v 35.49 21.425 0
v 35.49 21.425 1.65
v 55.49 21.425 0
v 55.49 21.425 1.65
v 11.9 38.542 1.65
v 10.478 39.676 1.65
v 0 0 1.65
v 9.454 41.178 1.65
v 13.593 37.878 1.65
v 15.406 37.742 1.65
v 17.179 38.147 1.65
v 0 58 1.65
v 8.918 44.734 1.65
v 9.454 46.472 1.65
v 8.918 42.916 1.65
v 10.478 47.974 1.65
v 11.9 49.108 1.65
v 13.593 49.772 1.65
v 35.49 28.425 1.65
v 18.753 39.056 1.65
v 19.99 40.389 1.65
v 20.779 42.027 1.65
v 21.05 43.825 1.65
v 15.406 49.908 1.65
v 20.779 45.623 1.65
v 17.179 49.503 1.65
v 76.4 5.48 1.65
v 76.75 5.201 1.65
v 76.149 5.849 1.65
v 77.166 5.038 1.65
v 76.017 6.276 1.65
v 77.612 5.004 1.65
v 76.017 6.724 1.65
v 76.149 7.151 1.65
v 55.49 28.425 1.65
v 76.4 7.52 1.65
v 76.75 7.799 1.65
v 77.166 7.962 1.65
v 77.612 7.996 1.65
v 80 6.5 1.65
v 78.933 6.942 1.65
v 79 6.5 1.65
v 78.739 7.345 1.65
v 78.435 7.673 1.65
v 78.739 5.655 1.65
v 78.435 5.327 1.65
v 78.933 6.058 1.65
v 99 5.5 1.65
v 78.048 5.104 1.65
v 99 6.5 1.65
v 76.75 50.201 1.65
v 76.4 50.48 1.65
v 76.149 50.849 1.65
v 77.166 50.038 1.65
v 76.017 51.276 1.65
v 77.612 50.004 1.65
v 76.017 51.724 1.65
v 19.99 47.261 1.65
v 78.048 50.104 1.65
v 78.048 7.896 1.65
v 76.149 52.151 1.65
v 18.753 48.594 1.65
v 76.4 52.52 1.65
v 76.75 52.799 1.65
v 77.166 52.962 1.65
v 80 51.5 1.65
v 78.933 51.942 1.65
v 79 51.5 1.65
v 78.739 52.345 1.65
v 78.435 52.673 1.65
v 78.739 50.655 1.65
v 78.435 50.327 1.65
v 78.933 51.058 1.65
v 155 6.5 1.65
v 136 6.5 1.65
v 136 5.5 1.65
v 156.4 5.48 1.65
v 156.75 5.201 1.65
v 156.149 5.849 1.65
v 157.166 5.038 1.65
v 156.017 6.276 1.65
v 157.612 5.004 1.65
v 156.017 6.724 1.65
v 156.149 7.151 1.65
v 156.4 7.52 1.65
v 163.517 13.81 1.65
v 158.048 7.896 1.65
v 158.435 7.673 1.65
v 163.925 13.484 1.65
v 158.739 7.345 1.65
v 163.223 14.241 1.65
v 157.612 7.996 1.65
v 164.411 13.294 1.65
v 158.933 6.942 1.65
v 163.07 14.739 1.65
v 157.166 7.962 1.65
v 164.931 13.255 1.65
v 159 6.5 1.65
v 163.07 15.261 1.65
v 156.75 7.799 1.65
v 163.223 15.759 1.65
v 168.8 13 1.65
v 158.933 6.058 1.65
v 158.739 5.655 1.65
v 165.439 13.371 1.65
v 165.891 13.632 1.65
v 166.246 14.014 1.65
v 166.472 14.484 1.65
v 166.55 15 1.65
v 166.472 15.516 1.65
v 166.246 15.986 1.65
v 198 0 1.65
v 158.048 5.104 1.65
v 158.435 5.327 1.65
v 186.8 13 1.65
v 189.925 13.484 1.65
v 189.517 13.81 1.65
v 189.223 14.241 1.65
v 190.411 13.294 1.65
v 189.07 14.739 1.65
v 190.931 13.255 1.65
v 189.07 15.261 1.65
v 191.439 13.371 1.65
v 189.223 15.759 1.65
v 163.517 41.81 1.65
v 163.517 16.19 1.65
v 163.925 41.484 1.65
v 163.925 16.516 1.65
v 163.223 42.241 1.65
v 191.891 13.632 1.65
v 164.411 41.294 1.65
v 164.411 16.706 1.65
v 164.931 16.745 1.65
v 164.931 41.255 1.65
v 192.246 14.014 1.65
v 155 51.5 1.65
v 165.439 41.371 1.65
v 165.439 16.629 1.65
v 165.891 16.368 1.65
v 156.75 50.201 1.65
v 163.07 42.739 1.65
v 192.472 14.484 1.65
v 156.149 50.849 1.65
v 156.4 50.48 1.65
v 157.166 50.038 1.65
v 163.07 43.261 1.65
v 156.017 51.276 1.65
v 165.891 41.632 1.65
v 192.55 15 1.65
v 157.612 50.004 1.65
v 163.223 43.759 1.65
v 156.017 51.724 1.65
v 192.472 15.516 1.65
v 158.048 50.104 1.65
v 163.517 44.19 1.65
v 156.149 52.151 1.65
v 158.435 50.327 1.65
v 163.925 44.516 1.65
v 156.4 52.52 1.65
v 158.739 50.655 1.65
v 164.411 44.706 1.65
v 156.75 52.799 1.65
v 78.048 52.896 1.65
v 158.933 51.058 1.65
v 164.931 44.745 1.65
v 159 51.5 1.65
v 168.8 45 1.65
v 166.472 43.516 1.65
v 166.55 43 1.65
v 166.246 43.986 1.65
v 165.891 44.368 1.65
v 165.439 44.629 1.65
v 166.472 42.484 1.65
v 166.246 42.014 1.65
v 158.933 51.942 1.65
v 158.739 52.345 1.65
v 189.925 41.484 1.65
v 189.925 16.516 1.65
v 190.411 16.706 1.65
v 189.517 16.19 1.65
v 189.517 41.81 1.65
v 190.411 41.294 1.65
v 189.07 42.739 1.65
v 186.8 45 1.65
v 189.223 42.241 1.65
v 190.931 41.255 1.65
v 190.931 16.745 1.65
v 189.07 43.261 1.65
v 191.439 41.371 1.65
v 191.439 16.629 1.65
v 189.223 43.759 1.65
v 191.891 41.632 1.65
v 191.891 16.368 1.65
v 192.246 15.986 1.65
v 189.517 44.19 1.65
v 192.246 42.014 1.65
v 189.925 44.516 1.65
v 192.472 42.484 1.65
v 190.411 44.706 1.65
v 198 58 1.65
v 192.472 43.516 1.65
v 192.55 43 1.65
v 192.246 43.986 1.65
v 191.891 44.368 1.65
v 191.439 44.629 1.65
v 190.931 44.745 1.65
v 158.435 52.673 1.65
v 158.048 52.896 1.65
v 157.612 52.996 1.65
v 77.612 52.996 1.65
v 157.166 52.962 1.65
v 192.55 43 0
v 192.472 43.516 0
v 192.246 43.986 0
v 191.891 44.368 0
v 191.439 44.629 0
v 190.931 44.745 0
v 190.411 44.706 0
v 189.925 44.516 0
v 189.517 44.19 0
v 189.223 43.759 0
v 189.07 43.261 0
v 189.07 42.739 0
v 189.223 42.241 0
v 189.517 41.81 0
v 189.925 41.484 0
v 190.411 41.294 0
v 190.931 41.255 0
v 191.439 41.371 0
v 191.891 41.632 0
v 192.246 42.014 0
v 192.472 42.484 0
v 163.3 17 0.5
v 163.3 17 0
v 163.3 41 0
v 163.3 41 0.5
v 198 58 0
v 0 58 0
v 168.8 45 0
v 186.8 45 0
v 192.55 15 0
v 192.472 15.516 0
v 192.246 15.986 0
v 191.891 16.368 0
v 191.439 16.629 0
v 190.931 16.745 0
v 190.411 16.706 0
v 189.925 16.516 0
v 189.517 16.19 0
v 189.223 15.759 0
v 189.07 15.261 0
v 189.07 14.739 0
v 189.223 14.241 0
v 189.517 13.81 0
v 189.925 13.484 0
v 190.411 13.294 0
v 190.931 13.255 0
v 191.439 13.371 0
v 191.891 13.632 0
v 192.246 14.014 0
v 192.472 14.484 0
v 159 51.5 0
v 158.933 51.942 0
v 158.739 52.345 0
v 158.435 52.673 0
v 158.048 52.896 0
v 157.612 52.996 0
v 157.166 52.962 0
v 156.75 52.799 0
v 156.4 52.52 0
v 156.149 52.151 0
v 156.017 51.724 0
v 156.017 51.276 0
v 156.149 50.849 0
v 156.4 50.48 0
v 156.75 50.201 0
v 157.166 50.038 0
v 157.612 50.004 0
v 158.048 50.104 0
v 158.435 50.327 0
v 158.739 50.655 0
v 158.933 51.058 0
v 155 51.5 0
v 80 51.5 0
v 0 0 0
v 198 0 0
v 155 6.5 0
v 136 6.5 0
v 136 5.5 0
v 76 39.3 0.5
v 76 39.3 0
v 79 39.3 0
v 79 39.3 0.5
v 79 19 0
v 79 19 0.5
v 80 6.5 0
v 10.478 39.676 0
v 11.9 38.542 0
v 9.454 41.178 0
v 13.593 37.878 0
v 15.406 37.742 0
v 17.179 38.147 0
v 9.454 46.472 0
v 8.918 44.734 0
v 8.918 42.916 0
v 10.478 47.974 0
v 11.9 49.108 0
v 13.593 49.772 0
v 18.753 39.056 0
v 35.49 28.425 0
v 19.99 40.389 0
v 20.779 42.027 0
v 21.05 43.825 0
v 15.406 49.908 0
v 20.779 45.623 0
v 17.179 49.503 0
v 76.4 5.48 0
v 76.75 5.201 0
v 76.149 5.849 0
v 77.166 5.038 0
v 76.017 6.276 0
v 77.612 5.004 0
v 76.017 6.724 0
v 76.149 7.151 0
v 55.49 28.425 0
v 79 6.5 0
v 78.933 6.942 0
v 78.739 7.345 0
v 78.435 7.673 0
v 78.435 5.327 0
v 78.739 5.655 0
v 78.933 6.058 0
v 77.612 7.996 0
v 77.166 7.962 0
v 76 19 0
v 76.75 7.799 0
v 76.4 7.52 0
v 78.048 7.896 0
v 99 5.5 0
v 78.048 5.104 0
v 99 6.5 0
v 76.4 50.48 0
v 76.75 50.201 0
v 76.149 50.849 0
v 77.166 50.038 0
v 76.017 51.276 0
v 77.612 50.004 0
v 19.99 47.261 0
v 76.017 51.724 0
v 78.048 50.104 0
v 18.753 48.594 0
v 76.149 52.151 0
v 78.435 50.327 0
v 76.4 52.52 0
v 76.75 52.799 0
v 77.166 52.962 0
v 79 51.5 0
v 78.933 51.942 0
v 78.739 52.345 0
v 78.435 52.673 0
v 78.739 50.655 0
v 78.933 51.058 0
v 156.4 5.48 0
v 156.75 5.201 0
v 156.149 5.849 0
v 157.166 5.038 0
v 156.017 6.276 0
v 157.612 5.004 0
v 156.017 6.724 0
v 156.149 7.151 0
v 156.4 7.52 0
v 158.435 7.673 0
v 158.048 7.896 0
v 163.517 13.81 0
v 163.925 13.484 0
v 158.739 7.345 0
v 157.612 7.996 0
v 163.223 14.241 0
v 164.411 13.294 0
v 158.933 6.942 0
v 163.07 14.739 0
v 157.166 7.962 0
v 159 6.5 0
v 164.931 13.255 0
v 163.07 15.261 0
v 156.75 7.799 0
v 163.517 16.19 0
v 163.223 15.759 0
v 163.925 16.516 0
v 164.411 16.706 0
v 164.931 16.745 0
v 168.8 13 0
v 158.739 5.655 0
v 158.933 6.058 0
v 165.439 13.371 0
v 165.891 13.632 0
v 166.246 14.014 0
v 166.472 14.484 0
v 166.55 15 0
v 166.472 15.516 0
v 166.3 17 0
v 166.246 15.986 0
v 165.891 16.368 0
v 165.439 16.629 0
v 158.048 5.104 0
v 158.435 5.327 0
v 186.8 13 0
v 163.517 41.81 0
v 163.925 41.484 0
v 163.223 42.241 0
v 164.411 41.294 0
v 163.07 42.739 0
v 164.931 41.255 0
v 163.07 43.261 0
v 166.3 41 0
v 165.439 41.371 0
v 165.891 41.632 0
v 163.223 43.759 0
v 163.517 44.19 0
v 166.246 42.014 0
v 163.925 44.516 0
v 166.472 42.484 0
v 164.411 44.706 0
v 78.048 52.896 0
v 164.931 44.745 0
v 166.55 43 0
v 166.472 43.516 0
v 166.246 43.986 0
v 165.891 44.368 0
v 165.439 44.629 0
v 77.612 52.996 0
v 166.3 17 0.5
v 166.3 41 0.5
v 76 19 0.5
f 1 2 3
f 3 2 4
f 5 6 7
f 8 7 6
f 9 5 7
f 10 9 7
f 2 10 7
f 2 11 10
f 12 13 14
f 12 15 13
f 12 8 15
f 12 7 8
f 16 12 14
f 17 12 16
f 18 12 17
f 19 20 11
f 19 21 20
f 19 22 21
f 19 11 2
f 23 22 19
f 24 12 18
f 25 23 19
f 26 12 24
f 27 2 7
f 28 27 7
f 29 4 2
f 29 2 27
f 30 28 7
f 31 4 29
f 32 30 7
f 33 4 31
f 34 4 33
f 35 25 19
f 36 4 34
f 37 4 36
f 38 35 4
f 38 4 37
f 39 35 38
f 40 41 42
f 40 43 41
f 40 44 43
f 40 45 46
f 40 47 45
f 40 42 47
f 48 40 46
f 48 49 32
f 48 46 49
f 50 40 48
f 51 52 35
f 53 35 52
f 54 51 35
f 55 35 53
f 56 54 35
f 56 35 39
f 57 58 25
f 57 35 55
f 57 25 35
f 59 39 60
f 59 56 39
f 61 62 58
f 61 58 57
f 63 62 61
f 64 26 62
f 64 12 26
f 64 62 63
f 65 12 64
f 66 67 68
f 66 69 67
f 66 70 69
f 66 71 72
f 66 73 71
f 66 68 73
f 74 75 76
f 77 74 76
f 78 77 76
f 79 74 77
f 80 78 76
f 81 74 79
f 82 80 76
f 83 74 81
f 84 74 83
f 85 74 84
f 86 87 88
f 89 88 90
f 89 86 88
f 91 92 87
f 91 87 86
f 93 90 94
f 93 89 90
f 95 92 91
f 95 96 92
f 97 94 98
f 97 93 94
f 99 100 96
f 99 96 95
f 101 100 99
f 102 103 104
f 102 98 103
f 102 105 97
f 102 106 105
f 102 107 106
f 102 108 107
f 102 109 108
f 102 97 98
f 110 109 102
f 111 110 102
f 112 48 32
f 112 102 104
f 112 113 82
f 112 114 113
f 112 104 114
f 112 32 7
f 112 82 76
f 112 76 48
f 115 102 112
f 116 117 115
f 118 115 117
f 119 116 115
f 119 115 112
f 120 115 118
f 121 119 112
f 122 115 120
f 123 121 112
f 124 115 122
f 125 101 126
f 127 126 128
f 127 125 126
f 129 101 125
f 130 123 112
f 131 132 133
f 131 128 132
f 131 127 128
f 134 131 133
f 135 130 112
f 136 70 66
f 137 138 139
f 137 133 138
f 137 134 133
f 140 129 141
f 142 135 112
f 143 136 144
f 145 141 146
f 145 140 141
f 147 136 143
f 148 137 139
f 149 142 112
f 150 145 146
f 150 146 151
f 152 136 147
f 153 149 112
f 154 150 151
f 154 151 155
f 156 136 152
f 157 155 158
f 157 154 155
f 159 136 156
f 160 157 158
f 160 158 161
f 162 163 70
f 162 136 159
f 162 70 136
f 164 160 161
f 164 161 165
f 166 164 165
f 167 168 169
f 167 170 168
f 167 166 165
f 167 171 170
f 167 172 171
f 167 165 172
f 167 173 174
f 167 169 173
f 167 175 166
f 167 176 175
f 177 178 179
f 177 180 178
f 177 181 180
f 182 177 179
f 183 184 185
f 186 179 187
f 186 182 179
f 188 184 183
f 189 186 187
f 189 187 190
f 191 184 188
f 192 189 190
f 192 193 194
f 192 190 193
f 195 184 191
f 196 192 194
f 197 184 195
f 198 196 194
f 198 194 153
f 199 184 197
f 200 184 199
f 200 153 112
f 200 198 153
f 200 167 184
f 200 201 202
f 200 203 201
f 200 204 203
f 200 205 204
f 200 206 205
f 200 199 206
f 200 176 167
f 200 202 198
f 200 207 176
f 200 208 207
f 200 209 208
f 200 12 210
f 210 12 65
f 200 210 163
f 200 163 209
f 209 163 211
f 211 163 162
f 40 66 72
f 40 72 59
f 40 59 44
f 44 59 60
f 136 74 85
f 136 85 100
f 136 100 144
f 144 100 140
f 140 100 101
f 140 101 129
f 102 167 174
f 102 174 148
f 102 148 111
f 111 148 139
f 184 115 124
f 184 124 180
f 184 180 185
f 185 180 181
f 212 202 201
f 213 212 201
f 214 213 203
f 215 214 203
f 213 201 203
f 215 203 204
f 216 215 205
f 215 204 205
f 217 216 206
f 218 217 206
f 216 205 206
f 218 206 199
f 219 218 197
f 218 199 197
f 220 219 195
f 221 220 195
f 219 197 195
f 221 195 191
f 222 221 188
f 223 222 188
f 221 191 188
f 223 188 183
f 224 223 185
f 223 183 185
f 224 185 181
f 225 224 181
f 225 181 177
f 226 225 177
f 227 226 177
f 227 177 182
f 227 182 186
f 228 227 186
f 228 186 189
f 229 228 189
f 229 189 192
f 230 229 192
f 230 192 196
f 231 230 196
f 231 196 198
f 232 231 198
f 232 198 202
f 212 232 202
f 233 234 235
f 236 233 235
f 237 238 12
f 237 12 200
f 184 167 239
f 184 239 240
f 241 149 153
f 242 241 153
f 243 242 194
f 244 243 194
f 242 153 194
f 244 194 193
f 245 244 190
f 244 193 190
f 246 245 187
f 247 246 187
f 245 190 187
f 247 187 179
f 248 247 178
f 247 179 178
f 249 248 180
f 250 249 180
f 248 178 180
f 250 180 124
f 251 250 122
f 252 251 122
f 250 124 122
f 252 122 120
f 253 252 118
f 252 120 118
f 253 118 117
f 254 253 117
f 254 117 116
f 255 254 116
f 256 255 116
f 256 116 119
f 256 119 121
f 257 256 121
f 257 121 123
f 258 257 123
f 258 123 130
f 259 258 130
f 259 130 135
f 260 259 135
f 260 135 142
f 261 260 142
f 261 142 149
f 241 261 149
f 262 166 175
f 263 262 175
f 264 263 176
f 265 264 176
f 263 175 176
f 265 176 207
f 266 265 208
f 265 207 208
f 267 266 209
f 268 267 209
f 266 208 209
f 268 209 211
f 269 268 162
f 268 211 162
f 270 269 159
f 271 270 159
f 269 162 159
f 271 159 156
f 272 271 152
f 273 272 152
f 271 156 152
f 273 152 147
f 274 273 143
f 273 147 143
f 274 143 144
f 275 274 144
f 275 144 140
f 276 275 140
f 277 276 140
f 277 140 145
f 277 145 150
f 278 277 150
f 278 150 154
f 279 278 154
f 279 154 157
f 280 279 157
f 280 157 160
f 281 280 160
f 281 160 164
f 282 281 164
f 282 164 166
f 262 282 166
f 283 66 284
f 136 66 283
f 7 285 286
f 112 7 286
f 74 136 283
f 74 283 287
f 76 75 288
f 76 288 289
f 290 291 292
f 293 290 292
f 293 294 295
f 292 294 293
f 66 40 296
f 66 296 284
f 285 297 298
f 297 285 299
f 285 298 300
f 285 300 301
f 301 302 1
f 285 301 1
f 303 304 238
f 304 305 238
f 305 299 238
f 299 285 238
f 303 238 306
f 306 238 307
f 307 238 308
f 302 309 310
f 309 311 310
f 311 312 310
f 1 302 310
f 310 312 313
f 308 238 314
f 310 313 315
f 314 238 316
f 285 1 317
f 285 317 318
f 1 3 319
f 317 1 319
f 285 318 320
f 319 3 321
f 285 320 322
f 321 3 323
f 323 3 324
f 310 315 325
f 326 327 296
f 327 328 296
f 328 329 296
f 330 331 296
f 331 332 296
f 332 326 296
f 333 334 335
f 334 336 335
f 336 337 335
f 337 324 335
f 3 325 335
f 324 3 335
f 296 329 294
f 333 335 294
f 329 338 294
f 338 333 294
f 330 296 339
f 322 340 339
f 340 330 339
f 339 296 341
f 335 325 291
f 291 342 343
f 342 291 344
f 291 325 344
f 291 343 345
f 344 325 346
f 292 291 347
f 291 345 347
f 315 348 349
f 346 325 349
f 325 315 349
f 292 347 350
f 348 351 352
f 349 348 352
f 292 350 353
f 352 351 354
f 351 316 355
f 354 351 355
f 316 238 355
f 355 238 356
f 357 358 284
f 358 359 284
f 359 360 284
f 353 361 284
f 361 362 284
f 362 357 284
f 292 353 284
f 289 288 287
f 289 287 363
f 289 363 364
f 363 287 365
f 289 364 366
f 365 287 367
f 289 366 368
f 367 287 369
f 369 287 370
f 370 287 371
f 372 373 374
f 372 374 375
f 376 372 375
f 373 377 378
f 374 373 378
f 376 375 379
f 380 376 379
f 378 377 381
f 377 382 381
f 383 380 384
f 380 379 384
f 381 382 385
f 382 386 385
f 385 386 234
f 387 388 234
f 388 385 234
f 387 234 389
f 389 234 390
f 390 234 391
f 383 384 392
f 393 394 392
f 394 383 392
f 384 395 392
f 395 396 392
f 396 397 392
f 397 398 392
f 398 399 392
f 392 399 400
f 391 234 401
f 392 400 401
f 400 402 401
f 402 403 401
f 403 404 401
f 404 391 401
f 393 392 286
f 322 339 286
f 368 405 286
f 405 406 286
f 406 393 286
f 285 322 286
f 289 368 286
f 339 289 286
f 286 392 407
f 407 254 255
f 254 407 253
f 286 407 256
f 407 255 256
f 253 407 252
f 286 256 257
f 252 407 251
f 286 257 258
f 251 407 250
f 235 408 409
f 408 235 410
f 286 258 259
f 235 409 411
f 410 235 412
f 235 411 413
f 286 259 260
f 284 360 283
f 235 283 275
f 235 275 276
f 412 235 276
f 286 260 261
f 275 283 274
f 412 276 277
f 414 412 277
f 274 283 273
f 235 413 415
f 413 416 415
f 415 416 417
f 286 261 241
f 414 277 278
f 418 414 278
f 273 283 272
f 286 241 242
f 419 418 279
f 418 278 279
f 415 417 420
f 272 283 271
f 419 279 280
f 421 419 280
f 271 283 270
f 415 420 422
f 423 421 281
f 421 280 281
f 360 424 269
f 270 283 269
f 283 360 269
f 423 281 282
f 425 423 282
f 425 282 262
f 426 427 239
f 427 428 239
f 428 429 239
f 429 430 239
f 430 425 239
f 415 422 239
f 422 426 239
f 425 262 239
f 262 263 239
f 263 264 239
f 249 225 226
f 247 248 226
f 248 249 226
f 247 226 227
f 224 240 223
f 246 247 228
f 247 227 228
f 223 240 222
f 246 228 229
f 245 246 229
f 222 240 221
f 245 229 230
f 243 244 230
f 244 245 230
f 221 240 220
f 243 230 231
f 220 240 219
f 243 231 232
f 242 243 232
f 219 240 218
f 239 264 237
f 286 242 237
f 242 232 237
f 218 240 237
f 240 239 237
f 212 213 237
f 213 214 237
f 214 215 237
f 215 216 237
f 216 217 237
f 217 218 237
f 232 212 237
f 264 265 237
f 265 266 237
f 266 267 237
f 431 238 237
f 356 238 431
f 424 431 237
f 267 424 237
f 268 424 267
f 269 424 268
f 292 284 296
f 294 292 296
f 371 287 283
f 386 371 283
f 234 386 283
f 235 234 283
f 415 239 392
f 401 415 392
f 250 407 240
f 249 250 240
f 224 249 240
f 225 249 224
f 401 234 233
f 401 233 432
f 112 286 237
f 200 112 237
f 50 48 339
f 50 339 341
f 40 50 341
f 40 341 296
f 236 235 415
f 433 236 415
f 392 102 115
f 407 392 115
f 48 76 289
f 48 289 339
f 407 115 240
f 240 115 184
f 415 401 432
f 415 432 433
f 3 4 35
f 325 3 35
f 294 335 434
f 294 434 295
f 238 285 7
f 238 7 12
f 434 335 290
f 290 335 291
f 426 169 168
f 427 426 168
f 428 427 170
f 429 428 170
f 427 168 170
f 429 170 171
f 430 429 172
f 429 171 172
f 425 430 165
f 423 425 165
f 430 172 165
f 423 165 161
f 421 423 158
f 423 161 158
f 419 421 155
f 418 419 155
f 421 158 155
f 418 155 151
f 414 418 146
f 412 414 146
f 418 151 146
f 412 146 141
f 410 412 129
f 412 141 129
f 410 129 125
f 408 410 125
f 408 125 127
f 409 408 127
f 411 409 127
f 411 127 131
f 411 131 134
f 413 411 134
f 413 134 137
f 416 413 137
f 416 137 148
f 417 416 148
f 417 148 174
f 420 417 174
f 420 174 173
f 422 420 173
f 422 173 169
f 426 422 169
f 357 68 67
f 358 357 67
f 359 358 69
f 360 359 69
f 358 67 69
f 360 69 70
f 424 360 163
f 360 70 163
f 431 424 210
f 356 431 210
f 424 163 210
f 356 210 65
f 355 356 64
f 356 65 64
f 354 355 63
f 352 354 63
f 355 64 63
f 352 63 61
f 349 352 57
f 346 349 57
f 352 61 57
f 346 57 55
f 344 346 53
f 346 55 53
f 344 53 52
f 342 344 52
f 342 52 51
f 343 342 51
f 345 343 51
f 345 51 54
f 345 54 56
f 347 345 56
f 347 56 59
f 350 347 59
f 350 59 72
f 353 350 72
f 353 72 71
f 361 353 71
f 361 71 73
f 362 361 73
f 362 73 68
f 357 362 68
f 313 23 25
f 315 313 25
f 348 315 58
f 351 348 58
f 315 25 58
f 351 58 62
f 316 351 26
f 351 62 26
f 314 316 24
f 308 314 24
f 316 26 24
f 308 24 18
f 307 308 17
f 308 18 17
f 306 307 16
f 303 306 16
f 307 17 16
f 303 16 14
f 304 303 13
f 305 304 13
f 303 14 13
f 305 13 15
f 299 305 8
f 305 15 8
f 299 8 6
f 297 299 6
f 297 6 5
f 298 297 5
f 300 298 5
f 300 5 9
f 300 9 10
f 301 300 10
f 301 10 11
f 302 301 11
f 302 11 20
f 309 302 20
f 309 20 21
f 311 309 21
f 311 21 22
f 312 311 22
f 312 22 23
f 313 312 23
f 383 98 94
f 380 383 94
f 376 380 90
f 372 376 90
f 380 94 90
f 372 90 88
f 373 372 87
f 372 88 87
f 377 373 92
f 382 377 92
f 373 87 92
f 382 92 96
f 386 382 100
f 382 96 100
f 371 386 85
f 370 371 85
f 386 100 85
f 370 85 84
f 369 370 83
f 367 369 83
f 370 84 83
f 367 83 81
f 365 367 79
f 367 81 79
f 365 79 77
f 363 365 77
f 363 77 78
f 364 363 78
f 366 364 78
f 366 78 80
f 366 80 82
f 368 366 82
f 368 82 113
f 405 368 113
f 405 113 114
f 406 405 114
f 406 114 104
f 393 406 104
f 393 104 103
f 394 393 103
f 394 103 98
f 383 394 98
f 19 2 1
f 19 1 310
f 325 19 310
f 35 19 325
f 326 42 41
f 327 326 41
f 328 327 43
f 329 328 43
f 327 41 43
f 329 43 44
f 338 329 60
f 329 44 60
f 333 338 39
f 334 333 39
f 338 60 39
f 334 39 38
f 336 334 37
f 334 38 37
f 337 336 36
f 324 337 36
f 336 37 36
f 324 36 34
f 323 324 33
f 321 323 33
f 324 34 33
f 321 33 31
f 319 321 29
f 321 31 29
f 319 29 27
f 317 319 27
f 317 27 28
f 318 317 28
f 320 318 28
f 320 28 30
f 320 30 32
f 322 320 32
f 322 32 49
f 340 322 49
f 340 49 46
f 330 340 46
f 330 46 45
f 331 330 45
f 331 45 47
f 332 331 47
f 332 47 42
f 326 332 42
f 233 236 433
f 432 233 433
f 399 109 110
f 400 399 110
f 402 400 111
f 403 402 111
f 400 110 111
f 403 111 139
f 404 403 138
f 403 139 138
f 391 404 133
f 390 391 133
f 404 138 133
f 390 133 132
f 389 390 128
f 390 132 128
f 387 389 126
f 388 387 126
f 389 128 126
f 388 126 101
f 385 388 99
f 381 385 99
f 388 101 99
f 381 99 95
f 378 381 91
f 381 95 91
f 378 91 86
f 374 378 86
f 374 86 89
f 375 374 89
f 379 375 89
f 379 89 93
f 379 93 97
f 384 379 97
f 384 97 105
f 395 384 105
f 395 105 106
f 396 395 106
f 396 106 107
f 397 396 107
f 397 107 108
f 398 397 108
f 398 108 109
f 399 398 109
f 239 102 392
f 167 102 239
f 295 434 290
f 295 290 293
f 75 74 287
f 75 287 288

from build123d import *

# Parameters (mm, degrees)
SKETCH_W        = 198
SKETCH_H        = 58
PAD_DEPTH       = 1.65
SKETCH001_R     = 6.1
SKETCH001_R_2   = 1.75
SKETCH001_R_3   = 1.5
SKETCH001_W     = 18
SKETCH001_H     = 32
SKETCH001_W_2   = 20
SKETCH001_H_2   = 7
POCKET_DEPTH    = 5
SKETCH002_W     = 3
SKETCH002_H     = 20.3
SKETCH002_H_2   = 24
POCKET001_DEPTH = 0.5


with BuildPart() as part:
    # Sketch → Pad (new body)
    with BuildSketch(Plane.XY):
        with Locations((99, 29)):
            Rectangle(SKETCH_W, SKETCH_H)
    extrude(amount=PAD_DEPTH)

    # Sketch001 (on Face6 of Pad) → Pocket (cut)
    with BuildSketch(Plane.XY.offset(1.65)):
        with Locations((14.95, 43.825)):
            Circle(SKETCH001_R)
        with Locations((164.8, 43)):
            Circle(SKETCH001_R_2)
        with Locations((190.8, 43)):
            Circle(SKETCH001_R_2)
        with Locations((164.8, 15)):
            Circle(SKETCH001_R_2)
        with Locations((190.8, 15)):
            Circle(SKETCH001_R_2)
        with Locations((77.5, 51.5)):
            Circle(SKETCH001_R_3)
        with Locations((77.5, 6.5)):
            Circle(SKETCH001_R_3)
        with Locations((157.5, 6.5)):
            Circle(SKETCH001_R_3)
        with Locations((157.5, 51.5)):
            Circle(SKETCH001_R_3)
        with Locations((177.8, 29)):
            Rectangle(SKETCH001_W, SKETCH001_H)
        with Locations((45.49, 24.925)):
            Rectangle(SKETCH001_W_2, SKETCH001_H_2)
        Polygon((80, 51.5), (155, 51.5), (155, 6.5), (136, 6.5), (136, 5.5), (99, 5.5), (99, 6.5), (80, 6.5), align=None)
    extrude(amount=-POCKET_DEPTH, mode=Mode.SUBTRACT)

    # Sketch002 → Pocket001 (cut)
    with BuildSketch(Plane.XY):
        with Locations((77.5, 29.15)):
            Rectangle(SKETCH002_W, SKETCH002_H)
        with Locations((164.8, 29)):
            Rectangle(SKETCH002_W, SKETCH002_H_2)
    extrude(amount=POCKET001_DEPTH, mode=Mode.SUBTRACT)


solid = part.part
